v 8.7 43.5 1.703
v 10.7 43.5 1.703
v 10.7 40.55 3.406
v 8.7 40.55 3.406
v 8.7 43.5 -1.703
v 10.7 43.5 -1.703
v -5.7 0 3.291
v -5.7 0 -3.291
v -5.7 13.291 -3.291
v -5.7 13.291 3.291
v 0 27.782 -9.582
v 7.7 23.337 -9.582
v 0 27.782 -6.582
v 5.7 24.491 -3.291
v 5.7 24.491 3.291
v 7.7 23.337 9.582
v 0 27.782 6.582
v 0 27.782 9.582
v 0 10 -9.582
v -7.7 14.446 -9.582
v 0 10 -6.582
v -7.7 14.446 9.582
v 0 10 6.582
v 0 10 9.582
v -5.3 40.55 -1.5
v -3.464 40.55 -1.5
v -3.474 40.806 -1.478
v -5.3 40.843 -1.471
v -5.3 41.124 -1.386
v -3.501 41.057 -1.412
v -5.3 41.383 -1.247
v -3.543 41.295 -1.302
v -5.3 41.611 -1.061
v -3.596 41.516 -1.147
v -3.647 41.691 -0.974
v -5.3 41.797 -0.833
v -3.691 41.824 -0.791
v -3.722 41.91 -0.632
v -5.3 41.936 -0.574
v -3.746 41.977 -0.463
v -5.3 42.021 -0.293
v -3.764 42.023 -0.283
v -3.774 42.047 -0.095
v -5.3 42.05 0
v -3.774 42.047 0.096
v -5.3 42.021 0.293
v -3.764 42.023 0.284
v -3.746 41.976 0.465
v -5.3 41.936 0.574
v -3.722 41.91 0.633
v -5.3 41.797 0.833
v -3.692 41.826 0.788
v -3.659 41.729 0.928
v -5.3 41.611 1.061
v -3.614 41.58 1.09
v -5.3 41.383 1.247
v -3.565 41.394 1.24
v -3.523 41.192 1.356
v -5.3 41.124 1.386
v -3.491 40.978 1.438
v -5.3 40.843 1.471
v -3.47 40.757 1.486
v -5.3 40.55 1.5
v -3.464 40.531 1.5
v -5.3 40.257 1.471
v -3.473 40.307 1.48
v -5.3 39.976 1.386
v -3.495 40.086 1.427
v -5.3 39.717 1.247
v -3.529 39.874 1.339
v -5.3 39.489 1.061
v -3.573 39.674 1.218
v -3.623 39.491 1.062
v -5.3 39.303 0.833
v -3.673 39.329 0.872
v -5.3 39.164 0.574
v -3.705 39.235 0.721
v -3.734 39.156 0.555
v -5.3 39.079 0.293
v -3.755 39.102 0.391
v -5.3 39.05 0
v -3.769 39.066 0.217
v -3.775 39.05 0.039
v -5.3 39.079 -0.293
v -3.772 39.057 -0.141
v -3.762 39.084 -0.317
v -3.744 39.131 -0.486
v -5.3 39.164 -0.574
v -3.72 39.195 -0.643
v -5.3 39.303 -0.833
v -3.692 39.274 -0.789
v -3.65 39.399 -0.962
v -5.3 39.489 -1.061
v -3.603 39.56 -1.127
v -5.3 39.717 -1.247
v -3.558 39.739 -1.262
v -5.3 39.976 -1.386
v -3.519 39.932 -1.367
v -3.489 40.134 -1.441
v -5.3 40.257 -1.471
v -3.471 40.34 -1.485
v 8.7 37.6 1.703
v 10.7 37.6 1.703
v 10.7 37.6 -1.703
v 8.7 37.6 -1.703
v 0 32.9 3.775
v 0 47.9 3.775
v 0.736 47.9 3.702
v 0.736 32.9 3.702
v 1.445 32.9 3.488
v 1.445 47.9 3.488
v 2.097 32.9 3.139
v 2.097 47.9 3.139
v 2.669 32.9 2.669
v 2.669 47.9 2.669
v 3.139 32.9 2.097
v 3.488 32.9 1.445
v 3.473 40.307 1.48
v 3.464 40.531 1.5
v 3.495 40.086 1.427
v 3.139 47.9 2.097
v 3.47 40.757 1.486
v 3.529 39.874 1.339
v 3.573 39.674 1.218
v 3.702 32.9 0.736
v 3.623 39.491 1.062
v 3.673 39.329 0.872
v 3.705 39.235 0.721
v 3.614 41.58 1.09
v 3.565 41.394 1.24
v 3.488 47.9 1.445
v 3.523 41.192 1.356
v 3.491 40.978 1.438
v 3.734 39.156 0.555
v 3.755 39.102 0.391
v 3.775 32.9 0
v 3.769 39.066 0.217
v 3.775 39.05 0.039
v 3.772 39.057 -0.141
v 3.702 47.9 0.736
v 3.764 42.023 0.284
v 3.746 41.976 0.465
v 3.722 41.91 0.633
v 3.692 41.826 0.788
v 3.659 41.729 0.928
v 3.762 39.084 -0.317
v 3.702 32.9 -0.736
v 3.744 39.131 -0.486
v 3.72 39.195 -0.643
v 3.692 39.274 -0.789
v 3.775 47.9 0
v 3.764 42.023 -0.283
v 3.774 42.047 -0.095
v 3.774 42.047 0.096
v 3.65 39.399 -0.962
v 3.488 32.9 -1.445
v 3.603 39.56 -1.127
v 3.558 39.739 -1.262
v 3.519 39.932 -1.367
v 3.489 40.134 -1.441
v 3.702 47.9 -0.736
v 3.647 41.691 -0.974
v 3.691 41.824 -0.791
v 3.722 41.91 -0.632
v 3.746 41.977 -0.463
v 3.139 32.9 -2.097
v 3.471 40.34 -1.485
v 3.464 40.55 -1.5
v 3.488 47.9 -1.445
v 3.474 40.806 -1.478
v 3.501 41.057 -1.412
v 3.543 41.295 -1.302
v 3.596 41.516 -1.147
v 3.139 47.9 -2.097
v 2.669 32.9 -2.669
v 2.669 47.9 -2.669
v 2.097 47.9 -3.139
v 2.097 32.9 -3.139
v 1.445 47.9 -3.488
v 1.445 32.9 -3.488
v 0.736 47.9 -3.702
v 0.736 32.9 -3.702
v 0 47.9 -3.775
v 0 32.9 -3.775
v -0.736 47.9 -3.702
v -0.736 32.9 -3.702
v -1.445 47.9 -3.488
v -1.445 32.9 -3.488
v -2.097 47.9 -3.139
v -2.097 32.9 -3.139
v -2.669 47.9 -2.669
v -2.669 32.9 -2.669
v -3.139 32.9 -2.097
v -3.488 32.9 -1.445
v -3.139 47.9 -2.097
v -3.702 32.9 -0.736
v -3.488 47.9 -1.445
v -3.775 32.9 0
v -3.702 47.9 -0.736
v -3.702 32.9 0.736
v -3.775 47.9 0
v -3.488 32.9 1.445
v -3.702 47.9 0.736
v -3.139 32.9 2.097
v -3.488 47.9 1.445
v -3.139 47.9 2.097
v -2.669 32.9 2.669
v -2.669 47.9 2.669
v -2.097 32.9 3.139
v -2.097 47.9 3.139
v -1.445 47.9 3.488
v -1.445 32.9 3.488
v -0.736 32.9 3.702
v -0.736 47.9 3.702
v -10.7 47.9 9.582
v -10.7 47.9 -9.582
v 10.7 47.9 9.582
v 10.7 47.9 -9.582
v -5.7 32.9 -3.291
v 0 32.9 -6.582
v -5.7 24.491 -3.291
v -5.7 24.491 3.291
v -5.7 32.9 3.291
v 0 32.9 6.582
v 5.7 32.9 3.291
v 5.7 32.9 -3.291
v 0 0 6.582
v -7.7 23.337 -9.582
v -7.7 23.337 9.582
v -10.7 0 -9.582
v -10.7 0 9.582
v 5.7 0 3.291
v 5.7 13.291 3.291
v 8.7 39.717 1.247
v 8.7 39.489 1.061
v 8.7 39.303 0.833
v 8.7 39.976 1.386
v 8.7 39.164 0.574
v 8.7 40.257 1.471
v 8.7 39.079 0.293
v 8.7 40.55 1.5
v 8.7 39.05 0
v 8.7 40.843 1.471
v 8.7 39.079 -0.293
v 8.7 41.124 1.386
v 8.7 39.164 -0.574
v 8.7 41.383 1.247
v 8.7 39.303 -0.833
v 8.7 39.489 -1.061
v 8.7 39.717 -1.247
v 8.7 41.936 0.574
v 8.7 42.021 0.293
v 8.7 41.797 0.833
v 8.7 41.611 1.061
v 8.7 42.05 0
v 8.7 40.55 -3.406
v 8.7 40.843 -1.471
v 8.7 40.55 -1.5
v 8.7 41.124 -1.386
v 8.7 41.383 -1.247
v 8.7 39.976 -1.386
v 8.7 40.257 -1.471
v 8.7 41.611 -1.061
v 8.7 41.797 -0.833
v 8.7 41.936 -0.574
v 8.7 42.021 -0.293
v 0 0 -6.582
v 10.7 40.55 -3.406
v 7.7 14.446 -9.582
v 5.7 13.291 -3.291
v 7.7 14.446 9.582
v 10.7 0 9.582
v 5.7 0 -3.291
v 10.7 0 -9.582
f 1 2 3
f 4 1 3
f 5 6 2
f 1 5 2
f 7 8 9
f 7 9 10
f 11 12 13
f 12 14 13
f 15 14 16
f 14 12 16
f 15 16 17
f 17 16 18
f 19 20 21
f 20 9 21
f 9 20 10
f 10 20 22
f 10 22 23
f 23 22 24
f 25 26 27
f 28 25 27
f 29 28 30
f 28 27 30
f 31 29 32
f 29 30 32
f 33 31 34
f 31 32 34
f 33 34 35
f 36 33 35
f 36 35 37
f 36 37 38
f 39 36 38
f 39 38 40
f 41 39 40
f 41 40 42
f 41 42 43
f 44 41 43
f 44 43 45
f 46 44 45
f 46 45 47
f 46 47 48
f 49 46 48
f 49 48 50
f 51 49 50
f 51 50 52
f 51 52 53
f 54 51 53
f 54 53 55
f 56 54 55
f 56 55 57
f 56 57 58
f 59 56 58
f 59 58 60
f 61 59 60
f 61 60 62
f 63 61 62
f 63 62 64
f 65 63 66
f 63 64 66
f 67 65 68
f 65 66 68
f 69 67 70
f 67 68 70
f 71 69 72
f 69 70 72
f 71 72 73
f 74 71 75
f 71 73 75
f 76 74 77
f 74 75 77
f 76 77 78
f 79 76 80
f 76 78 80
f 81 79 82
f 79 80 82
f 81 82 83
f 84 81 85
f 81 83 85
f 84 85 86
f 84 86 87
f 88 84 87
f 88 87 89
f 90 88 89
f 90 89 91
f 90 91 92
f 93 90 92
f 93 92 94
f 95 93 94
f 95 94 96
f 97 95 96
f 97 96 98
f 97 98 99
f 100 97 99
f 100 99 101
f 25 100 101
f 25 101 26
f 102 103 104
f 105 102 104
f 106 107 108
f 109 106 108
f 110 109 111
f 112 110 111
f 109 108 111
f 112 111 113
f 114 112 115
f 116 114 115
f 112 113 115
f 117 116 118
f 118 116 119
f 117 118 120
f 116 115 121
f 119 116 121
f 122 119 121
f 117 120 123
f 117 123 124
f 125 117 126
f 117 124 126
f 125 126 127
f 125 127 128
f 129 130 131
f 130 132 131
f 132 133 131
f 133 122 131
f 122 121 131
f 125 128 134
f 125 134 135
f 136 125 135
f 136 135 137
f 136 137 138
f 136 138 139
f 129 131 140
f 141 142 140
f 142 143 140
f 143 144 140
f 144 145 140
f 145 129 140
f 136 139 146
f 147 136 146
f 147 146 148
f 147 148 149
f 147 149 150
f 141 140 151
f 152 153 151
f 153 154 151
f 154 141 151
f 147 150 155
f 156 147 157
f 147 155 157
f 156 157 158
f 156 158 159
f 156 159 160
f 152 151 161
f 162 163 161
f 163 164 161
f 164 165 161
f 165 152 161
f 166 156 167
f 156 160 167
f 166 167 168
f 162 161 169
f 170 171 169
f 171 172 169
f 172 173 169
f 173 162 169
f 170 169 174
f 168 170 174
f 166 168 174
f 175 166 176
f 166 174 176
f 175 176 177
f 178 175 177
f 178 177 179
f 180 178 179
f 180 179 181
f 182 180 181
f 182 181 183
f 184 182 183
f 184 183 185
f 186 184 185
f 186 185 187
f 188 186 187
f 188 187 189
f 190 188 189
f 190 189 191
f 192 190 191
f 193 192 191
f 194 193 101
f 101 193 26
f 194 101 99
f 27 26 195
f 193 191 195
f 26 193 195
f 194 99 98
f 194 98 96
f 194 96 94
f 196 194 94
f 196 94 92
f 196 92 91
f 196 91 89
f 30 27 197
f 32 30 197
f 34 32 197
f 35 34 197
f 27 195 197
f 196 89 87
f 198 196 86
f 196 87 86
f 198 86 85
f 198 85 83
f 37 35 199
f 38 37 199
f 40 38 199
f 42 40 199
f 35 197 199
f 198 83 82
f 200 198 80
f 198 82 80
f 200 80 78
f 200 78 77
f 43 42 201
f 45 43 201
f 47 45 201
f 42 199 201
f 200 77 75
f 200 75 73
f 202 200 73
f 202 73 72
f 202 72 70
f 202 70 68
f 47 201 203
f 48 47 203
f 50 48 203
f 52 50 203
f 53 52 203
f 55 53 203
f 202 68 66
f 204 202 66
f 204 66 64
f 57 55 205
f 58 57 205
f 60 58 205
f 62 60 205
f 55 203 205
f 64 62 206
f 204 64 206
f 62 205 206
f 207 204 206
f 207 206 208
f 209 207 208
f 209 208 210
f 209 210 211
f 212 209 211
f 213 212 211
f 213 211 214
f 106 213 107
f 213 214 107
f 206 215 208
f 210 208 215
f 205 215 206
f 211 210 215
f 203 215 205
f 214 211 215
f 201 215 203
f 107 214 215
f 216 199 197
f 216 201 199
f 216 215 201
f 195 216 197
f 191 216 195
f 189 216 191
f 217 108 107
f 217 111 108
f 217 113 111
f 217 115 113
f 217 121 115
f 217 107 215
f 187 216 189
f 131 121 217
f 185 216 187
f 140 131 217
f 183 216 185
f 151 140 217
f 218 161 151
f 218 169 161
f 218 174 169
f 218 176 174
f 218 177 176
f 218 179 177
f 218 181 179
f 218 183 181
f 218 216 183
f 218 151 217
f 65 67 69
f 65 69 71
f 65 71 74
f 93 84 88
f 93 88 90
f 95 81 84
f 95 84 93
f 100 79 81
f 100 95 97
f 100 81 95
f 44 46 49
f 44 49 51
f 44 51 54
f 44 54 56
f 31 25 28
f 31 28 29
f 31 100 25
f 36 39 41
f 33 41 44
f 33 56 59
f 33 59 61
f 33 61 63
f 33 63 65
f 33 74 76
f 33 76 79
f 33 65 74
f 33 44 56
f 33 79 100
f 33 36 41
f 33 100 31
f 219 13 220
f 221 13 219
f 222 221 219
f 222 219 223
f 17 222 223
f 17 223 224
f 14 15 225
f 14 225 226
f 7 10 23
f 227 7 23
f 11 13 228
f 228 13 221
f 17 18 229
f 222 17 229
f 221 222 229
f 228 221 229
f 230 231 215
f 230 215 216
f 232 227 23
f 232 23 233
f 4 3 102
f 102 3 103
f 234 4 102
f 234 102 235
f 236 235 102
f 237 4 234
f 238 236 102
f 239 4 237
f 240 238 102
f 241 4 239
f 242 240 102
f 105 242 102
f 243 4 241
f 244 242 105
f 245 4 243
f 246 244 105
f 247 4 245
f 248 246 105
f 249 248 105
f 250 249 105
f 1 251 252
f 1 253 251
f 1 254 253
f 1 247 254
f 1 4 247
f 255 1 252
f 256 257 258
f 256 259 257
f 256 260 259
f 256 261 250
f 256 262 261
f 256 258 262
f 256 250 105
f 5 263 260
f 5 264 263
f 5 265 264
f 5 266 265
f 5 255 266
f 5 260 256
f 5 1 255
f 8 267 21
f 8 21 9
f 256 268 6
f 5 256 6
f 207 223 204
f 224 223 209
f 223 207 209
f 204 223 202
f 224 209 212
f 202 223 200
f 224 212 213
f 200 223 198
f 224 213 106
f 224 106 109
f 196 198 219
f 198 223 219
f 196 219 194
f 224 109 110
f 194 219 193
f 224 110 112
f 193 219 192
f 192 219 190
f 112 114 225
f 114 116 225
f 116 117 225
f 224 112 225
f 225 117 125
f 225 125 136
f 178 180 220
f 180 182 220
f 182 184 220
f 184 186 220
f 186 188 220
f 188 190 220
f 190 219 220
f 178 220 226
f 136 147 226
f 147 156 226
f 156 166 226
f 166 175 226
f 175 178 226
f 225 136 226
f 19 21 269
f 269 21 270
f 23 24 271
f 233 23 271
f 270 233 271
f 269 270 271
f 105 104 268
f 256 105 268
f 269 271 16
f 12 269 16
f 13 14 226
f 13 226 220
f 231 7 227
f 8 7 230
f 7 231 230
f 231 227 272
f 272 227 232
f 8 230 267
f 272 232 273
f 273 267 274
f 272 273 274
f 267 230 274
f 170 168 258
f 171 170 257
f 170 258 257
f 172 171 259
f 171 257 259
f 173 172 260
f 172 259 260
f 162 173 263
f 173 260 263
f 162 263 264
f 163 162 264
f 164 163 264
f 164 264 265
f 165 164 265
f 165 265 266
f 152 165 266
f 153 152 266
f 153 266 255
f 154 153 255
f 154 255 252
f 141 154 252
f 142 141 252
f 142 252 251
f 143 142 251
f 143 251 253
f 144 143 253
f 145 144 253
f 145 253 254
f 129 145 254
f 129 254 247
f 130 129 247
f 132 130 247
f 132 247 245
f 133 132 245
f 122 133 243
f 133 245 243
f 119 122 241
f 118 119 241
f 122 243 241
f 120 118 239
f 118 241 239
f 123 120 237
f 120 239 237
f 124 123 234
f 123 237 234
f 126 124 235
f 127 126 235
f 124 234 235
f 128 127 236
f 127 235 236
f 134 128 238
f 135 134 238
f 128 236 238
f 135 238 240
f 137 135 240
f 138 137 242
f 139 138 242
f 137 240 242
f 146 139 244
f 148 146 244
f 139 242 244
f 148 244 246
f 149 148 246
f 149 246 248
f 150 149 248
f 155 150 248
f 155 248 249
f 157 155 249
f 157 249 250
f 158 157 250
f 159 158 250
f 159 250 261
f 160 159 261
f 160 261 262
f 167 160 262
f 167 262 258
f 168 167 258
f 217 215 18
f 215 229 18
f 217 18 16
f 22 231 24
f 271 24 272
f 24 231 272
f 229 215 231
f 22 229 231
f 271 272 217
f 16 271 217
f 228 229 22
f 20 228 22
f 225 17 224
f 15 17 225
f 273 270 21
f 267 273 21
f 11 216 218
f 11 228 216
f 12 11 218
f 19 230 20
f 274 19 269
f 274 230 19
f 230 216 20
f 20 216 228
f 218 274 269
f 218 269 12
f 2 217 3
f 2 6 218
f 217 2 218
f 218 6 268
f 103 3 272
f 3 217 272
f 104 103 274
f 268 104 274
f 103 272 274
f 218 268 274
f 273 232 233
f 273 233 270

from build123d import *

# Parameters (mm, degrees)
ESQUISSE1_W                  = 21.4
ESQUISSE1_H                  = 19.163586138
BOSS_EXTRU_1_DEPTH           = 47.9
ENL_V_MAT_EXTRU_1_DEPTH      = 32.9
ENL_V_MAT_EXTRU_2_REACH      = 49.9
ESQUISSE3_R                  = 3.775
ENL_V_MAT_EXTRU_3_DEPTH      = 1
ENL_V_MAT_EXTRU_3_DEPTH_BACK = 20.163586138
ESQUISSE5_R                  = 1.5
ENL_V_MAT_EXTRU_4_DEPTH      = 16
ENL_V_MAT_EXTRU_5_DEPTH      = 2


with BuildPart() as part:
    # Esquisse1 → Boss.-Extru.1 (new body)
    with BuildSketch(Plane(origin=(0, 0, 0), x_dir=(1, 0, 0), z_dir=(0, 1, 0))):
        Rectangle(ESQUISSE1_W, ESQUISSE1_H)
    extrude(amount=BOSS_EXTRU_1_DEPTH)

    # Esquisse2 → Enlèv. mat.-Extru.1 (cut)
    with BuildSketch(Plane(origin=(0, 0, 0), x_dir=(-1, 0, 0), z_dir=(0, -1, 0))):
        Polygon((5.7, -3.290896534), (0, -6.581793069), (-5.7, -3.290896534), (-5.7, 3.290896534), (0, 6.581793069), (5.7, 3.290896534), align=None)
    extrude(amount=-ENL_V_MAT_EXTRU_1_DEPTH, mode=Mode.SUBTRACT)

    # Esquisse3 → Enlèv. mat.-Extru.2 (cut, up to next)
    with BuildSketch(Plane(origin=(0, 47.9, 0), x_dir=(1, 0, 0), z_dir=(0, 1, 0)), mode=Mode.PRIVATE) as enl_v_mat_extru_2_sk1:
        with Locations(Location((0, 0, 0), (0, 0, 270))):  # turned: the seam where the file's is
            Circle(ESQUISSE3_R)
    enl_v_mat_extru_2_tool1 = extrude(enl_v_mat_extru_2_sk1.sketch, amount=-ENL_V_MAT_EXTRU_2_REACH, mode=Mode.PRIVATE) & part.part
    add(enl_v_mat_extru_2_tool1.solids().sort_by_distance((0, 47.9, 0))[0], mode=Mode.SUBTRACT)

    # Esquisse4 → Enlèv. mat.-Extru.3 (cut, two sides)
    with BuildSketch(Plane.XY.offset(9.581793069)) as enl_v_mat_extru_3_sk:
        Polygon((0, 27.782388291), (-7.7, 23.336791218), (-7.7, 14.445597073), (0, 10), (7.7, 14.445597073), (7.7, 23.336791218), align=None)
    extrude(amount=ENL_V_MAT_EXTRU_3_DEPTH, mode=Mode.SUBTRACT)
    extrude(enl_v_mat_extru_3_sk.sketch, amount=-ENL_V_MAT_EXTRU_3_DEPTH_BACK, mode=Mode.SUBTRACT)

    # Esquisse5 → Enlèv. mat.-Extru.4 (cut)
    with BuildSketch(Plane(origin=(10.7, 0, 0), x_dir=(0, 0, -1), z_dir=(1, 0, 0))):
        with Locations((0, 40.55)):
            Circle(ESQUISSE5_R)
    extrude(amount=-ENL_V_MAT_EXTRU_4_DEPTH, mode=Mode.SUBTRACT)

    # Esquisse6 → Enlèv. mat.-Extru.5 (cut)
    with BuildSketch(Plane(origin=(10.7, 0, 0), x_dir=(0, 0, -1), z_dir=(1, 0, 0))):
        Polygon((1.703183294, 43.5), (-1.703183294, 43.5), (-3.406366588, 40.55), (-1.703183294, 37.6), (1.703183294, 37.6), (3.406366588, 40.55), align=None)
    extrude(amount=-ENL_V_MAT_EXTRU_5_DEPTH, mode=Mode.SUBTRACT)


solid = part.part
